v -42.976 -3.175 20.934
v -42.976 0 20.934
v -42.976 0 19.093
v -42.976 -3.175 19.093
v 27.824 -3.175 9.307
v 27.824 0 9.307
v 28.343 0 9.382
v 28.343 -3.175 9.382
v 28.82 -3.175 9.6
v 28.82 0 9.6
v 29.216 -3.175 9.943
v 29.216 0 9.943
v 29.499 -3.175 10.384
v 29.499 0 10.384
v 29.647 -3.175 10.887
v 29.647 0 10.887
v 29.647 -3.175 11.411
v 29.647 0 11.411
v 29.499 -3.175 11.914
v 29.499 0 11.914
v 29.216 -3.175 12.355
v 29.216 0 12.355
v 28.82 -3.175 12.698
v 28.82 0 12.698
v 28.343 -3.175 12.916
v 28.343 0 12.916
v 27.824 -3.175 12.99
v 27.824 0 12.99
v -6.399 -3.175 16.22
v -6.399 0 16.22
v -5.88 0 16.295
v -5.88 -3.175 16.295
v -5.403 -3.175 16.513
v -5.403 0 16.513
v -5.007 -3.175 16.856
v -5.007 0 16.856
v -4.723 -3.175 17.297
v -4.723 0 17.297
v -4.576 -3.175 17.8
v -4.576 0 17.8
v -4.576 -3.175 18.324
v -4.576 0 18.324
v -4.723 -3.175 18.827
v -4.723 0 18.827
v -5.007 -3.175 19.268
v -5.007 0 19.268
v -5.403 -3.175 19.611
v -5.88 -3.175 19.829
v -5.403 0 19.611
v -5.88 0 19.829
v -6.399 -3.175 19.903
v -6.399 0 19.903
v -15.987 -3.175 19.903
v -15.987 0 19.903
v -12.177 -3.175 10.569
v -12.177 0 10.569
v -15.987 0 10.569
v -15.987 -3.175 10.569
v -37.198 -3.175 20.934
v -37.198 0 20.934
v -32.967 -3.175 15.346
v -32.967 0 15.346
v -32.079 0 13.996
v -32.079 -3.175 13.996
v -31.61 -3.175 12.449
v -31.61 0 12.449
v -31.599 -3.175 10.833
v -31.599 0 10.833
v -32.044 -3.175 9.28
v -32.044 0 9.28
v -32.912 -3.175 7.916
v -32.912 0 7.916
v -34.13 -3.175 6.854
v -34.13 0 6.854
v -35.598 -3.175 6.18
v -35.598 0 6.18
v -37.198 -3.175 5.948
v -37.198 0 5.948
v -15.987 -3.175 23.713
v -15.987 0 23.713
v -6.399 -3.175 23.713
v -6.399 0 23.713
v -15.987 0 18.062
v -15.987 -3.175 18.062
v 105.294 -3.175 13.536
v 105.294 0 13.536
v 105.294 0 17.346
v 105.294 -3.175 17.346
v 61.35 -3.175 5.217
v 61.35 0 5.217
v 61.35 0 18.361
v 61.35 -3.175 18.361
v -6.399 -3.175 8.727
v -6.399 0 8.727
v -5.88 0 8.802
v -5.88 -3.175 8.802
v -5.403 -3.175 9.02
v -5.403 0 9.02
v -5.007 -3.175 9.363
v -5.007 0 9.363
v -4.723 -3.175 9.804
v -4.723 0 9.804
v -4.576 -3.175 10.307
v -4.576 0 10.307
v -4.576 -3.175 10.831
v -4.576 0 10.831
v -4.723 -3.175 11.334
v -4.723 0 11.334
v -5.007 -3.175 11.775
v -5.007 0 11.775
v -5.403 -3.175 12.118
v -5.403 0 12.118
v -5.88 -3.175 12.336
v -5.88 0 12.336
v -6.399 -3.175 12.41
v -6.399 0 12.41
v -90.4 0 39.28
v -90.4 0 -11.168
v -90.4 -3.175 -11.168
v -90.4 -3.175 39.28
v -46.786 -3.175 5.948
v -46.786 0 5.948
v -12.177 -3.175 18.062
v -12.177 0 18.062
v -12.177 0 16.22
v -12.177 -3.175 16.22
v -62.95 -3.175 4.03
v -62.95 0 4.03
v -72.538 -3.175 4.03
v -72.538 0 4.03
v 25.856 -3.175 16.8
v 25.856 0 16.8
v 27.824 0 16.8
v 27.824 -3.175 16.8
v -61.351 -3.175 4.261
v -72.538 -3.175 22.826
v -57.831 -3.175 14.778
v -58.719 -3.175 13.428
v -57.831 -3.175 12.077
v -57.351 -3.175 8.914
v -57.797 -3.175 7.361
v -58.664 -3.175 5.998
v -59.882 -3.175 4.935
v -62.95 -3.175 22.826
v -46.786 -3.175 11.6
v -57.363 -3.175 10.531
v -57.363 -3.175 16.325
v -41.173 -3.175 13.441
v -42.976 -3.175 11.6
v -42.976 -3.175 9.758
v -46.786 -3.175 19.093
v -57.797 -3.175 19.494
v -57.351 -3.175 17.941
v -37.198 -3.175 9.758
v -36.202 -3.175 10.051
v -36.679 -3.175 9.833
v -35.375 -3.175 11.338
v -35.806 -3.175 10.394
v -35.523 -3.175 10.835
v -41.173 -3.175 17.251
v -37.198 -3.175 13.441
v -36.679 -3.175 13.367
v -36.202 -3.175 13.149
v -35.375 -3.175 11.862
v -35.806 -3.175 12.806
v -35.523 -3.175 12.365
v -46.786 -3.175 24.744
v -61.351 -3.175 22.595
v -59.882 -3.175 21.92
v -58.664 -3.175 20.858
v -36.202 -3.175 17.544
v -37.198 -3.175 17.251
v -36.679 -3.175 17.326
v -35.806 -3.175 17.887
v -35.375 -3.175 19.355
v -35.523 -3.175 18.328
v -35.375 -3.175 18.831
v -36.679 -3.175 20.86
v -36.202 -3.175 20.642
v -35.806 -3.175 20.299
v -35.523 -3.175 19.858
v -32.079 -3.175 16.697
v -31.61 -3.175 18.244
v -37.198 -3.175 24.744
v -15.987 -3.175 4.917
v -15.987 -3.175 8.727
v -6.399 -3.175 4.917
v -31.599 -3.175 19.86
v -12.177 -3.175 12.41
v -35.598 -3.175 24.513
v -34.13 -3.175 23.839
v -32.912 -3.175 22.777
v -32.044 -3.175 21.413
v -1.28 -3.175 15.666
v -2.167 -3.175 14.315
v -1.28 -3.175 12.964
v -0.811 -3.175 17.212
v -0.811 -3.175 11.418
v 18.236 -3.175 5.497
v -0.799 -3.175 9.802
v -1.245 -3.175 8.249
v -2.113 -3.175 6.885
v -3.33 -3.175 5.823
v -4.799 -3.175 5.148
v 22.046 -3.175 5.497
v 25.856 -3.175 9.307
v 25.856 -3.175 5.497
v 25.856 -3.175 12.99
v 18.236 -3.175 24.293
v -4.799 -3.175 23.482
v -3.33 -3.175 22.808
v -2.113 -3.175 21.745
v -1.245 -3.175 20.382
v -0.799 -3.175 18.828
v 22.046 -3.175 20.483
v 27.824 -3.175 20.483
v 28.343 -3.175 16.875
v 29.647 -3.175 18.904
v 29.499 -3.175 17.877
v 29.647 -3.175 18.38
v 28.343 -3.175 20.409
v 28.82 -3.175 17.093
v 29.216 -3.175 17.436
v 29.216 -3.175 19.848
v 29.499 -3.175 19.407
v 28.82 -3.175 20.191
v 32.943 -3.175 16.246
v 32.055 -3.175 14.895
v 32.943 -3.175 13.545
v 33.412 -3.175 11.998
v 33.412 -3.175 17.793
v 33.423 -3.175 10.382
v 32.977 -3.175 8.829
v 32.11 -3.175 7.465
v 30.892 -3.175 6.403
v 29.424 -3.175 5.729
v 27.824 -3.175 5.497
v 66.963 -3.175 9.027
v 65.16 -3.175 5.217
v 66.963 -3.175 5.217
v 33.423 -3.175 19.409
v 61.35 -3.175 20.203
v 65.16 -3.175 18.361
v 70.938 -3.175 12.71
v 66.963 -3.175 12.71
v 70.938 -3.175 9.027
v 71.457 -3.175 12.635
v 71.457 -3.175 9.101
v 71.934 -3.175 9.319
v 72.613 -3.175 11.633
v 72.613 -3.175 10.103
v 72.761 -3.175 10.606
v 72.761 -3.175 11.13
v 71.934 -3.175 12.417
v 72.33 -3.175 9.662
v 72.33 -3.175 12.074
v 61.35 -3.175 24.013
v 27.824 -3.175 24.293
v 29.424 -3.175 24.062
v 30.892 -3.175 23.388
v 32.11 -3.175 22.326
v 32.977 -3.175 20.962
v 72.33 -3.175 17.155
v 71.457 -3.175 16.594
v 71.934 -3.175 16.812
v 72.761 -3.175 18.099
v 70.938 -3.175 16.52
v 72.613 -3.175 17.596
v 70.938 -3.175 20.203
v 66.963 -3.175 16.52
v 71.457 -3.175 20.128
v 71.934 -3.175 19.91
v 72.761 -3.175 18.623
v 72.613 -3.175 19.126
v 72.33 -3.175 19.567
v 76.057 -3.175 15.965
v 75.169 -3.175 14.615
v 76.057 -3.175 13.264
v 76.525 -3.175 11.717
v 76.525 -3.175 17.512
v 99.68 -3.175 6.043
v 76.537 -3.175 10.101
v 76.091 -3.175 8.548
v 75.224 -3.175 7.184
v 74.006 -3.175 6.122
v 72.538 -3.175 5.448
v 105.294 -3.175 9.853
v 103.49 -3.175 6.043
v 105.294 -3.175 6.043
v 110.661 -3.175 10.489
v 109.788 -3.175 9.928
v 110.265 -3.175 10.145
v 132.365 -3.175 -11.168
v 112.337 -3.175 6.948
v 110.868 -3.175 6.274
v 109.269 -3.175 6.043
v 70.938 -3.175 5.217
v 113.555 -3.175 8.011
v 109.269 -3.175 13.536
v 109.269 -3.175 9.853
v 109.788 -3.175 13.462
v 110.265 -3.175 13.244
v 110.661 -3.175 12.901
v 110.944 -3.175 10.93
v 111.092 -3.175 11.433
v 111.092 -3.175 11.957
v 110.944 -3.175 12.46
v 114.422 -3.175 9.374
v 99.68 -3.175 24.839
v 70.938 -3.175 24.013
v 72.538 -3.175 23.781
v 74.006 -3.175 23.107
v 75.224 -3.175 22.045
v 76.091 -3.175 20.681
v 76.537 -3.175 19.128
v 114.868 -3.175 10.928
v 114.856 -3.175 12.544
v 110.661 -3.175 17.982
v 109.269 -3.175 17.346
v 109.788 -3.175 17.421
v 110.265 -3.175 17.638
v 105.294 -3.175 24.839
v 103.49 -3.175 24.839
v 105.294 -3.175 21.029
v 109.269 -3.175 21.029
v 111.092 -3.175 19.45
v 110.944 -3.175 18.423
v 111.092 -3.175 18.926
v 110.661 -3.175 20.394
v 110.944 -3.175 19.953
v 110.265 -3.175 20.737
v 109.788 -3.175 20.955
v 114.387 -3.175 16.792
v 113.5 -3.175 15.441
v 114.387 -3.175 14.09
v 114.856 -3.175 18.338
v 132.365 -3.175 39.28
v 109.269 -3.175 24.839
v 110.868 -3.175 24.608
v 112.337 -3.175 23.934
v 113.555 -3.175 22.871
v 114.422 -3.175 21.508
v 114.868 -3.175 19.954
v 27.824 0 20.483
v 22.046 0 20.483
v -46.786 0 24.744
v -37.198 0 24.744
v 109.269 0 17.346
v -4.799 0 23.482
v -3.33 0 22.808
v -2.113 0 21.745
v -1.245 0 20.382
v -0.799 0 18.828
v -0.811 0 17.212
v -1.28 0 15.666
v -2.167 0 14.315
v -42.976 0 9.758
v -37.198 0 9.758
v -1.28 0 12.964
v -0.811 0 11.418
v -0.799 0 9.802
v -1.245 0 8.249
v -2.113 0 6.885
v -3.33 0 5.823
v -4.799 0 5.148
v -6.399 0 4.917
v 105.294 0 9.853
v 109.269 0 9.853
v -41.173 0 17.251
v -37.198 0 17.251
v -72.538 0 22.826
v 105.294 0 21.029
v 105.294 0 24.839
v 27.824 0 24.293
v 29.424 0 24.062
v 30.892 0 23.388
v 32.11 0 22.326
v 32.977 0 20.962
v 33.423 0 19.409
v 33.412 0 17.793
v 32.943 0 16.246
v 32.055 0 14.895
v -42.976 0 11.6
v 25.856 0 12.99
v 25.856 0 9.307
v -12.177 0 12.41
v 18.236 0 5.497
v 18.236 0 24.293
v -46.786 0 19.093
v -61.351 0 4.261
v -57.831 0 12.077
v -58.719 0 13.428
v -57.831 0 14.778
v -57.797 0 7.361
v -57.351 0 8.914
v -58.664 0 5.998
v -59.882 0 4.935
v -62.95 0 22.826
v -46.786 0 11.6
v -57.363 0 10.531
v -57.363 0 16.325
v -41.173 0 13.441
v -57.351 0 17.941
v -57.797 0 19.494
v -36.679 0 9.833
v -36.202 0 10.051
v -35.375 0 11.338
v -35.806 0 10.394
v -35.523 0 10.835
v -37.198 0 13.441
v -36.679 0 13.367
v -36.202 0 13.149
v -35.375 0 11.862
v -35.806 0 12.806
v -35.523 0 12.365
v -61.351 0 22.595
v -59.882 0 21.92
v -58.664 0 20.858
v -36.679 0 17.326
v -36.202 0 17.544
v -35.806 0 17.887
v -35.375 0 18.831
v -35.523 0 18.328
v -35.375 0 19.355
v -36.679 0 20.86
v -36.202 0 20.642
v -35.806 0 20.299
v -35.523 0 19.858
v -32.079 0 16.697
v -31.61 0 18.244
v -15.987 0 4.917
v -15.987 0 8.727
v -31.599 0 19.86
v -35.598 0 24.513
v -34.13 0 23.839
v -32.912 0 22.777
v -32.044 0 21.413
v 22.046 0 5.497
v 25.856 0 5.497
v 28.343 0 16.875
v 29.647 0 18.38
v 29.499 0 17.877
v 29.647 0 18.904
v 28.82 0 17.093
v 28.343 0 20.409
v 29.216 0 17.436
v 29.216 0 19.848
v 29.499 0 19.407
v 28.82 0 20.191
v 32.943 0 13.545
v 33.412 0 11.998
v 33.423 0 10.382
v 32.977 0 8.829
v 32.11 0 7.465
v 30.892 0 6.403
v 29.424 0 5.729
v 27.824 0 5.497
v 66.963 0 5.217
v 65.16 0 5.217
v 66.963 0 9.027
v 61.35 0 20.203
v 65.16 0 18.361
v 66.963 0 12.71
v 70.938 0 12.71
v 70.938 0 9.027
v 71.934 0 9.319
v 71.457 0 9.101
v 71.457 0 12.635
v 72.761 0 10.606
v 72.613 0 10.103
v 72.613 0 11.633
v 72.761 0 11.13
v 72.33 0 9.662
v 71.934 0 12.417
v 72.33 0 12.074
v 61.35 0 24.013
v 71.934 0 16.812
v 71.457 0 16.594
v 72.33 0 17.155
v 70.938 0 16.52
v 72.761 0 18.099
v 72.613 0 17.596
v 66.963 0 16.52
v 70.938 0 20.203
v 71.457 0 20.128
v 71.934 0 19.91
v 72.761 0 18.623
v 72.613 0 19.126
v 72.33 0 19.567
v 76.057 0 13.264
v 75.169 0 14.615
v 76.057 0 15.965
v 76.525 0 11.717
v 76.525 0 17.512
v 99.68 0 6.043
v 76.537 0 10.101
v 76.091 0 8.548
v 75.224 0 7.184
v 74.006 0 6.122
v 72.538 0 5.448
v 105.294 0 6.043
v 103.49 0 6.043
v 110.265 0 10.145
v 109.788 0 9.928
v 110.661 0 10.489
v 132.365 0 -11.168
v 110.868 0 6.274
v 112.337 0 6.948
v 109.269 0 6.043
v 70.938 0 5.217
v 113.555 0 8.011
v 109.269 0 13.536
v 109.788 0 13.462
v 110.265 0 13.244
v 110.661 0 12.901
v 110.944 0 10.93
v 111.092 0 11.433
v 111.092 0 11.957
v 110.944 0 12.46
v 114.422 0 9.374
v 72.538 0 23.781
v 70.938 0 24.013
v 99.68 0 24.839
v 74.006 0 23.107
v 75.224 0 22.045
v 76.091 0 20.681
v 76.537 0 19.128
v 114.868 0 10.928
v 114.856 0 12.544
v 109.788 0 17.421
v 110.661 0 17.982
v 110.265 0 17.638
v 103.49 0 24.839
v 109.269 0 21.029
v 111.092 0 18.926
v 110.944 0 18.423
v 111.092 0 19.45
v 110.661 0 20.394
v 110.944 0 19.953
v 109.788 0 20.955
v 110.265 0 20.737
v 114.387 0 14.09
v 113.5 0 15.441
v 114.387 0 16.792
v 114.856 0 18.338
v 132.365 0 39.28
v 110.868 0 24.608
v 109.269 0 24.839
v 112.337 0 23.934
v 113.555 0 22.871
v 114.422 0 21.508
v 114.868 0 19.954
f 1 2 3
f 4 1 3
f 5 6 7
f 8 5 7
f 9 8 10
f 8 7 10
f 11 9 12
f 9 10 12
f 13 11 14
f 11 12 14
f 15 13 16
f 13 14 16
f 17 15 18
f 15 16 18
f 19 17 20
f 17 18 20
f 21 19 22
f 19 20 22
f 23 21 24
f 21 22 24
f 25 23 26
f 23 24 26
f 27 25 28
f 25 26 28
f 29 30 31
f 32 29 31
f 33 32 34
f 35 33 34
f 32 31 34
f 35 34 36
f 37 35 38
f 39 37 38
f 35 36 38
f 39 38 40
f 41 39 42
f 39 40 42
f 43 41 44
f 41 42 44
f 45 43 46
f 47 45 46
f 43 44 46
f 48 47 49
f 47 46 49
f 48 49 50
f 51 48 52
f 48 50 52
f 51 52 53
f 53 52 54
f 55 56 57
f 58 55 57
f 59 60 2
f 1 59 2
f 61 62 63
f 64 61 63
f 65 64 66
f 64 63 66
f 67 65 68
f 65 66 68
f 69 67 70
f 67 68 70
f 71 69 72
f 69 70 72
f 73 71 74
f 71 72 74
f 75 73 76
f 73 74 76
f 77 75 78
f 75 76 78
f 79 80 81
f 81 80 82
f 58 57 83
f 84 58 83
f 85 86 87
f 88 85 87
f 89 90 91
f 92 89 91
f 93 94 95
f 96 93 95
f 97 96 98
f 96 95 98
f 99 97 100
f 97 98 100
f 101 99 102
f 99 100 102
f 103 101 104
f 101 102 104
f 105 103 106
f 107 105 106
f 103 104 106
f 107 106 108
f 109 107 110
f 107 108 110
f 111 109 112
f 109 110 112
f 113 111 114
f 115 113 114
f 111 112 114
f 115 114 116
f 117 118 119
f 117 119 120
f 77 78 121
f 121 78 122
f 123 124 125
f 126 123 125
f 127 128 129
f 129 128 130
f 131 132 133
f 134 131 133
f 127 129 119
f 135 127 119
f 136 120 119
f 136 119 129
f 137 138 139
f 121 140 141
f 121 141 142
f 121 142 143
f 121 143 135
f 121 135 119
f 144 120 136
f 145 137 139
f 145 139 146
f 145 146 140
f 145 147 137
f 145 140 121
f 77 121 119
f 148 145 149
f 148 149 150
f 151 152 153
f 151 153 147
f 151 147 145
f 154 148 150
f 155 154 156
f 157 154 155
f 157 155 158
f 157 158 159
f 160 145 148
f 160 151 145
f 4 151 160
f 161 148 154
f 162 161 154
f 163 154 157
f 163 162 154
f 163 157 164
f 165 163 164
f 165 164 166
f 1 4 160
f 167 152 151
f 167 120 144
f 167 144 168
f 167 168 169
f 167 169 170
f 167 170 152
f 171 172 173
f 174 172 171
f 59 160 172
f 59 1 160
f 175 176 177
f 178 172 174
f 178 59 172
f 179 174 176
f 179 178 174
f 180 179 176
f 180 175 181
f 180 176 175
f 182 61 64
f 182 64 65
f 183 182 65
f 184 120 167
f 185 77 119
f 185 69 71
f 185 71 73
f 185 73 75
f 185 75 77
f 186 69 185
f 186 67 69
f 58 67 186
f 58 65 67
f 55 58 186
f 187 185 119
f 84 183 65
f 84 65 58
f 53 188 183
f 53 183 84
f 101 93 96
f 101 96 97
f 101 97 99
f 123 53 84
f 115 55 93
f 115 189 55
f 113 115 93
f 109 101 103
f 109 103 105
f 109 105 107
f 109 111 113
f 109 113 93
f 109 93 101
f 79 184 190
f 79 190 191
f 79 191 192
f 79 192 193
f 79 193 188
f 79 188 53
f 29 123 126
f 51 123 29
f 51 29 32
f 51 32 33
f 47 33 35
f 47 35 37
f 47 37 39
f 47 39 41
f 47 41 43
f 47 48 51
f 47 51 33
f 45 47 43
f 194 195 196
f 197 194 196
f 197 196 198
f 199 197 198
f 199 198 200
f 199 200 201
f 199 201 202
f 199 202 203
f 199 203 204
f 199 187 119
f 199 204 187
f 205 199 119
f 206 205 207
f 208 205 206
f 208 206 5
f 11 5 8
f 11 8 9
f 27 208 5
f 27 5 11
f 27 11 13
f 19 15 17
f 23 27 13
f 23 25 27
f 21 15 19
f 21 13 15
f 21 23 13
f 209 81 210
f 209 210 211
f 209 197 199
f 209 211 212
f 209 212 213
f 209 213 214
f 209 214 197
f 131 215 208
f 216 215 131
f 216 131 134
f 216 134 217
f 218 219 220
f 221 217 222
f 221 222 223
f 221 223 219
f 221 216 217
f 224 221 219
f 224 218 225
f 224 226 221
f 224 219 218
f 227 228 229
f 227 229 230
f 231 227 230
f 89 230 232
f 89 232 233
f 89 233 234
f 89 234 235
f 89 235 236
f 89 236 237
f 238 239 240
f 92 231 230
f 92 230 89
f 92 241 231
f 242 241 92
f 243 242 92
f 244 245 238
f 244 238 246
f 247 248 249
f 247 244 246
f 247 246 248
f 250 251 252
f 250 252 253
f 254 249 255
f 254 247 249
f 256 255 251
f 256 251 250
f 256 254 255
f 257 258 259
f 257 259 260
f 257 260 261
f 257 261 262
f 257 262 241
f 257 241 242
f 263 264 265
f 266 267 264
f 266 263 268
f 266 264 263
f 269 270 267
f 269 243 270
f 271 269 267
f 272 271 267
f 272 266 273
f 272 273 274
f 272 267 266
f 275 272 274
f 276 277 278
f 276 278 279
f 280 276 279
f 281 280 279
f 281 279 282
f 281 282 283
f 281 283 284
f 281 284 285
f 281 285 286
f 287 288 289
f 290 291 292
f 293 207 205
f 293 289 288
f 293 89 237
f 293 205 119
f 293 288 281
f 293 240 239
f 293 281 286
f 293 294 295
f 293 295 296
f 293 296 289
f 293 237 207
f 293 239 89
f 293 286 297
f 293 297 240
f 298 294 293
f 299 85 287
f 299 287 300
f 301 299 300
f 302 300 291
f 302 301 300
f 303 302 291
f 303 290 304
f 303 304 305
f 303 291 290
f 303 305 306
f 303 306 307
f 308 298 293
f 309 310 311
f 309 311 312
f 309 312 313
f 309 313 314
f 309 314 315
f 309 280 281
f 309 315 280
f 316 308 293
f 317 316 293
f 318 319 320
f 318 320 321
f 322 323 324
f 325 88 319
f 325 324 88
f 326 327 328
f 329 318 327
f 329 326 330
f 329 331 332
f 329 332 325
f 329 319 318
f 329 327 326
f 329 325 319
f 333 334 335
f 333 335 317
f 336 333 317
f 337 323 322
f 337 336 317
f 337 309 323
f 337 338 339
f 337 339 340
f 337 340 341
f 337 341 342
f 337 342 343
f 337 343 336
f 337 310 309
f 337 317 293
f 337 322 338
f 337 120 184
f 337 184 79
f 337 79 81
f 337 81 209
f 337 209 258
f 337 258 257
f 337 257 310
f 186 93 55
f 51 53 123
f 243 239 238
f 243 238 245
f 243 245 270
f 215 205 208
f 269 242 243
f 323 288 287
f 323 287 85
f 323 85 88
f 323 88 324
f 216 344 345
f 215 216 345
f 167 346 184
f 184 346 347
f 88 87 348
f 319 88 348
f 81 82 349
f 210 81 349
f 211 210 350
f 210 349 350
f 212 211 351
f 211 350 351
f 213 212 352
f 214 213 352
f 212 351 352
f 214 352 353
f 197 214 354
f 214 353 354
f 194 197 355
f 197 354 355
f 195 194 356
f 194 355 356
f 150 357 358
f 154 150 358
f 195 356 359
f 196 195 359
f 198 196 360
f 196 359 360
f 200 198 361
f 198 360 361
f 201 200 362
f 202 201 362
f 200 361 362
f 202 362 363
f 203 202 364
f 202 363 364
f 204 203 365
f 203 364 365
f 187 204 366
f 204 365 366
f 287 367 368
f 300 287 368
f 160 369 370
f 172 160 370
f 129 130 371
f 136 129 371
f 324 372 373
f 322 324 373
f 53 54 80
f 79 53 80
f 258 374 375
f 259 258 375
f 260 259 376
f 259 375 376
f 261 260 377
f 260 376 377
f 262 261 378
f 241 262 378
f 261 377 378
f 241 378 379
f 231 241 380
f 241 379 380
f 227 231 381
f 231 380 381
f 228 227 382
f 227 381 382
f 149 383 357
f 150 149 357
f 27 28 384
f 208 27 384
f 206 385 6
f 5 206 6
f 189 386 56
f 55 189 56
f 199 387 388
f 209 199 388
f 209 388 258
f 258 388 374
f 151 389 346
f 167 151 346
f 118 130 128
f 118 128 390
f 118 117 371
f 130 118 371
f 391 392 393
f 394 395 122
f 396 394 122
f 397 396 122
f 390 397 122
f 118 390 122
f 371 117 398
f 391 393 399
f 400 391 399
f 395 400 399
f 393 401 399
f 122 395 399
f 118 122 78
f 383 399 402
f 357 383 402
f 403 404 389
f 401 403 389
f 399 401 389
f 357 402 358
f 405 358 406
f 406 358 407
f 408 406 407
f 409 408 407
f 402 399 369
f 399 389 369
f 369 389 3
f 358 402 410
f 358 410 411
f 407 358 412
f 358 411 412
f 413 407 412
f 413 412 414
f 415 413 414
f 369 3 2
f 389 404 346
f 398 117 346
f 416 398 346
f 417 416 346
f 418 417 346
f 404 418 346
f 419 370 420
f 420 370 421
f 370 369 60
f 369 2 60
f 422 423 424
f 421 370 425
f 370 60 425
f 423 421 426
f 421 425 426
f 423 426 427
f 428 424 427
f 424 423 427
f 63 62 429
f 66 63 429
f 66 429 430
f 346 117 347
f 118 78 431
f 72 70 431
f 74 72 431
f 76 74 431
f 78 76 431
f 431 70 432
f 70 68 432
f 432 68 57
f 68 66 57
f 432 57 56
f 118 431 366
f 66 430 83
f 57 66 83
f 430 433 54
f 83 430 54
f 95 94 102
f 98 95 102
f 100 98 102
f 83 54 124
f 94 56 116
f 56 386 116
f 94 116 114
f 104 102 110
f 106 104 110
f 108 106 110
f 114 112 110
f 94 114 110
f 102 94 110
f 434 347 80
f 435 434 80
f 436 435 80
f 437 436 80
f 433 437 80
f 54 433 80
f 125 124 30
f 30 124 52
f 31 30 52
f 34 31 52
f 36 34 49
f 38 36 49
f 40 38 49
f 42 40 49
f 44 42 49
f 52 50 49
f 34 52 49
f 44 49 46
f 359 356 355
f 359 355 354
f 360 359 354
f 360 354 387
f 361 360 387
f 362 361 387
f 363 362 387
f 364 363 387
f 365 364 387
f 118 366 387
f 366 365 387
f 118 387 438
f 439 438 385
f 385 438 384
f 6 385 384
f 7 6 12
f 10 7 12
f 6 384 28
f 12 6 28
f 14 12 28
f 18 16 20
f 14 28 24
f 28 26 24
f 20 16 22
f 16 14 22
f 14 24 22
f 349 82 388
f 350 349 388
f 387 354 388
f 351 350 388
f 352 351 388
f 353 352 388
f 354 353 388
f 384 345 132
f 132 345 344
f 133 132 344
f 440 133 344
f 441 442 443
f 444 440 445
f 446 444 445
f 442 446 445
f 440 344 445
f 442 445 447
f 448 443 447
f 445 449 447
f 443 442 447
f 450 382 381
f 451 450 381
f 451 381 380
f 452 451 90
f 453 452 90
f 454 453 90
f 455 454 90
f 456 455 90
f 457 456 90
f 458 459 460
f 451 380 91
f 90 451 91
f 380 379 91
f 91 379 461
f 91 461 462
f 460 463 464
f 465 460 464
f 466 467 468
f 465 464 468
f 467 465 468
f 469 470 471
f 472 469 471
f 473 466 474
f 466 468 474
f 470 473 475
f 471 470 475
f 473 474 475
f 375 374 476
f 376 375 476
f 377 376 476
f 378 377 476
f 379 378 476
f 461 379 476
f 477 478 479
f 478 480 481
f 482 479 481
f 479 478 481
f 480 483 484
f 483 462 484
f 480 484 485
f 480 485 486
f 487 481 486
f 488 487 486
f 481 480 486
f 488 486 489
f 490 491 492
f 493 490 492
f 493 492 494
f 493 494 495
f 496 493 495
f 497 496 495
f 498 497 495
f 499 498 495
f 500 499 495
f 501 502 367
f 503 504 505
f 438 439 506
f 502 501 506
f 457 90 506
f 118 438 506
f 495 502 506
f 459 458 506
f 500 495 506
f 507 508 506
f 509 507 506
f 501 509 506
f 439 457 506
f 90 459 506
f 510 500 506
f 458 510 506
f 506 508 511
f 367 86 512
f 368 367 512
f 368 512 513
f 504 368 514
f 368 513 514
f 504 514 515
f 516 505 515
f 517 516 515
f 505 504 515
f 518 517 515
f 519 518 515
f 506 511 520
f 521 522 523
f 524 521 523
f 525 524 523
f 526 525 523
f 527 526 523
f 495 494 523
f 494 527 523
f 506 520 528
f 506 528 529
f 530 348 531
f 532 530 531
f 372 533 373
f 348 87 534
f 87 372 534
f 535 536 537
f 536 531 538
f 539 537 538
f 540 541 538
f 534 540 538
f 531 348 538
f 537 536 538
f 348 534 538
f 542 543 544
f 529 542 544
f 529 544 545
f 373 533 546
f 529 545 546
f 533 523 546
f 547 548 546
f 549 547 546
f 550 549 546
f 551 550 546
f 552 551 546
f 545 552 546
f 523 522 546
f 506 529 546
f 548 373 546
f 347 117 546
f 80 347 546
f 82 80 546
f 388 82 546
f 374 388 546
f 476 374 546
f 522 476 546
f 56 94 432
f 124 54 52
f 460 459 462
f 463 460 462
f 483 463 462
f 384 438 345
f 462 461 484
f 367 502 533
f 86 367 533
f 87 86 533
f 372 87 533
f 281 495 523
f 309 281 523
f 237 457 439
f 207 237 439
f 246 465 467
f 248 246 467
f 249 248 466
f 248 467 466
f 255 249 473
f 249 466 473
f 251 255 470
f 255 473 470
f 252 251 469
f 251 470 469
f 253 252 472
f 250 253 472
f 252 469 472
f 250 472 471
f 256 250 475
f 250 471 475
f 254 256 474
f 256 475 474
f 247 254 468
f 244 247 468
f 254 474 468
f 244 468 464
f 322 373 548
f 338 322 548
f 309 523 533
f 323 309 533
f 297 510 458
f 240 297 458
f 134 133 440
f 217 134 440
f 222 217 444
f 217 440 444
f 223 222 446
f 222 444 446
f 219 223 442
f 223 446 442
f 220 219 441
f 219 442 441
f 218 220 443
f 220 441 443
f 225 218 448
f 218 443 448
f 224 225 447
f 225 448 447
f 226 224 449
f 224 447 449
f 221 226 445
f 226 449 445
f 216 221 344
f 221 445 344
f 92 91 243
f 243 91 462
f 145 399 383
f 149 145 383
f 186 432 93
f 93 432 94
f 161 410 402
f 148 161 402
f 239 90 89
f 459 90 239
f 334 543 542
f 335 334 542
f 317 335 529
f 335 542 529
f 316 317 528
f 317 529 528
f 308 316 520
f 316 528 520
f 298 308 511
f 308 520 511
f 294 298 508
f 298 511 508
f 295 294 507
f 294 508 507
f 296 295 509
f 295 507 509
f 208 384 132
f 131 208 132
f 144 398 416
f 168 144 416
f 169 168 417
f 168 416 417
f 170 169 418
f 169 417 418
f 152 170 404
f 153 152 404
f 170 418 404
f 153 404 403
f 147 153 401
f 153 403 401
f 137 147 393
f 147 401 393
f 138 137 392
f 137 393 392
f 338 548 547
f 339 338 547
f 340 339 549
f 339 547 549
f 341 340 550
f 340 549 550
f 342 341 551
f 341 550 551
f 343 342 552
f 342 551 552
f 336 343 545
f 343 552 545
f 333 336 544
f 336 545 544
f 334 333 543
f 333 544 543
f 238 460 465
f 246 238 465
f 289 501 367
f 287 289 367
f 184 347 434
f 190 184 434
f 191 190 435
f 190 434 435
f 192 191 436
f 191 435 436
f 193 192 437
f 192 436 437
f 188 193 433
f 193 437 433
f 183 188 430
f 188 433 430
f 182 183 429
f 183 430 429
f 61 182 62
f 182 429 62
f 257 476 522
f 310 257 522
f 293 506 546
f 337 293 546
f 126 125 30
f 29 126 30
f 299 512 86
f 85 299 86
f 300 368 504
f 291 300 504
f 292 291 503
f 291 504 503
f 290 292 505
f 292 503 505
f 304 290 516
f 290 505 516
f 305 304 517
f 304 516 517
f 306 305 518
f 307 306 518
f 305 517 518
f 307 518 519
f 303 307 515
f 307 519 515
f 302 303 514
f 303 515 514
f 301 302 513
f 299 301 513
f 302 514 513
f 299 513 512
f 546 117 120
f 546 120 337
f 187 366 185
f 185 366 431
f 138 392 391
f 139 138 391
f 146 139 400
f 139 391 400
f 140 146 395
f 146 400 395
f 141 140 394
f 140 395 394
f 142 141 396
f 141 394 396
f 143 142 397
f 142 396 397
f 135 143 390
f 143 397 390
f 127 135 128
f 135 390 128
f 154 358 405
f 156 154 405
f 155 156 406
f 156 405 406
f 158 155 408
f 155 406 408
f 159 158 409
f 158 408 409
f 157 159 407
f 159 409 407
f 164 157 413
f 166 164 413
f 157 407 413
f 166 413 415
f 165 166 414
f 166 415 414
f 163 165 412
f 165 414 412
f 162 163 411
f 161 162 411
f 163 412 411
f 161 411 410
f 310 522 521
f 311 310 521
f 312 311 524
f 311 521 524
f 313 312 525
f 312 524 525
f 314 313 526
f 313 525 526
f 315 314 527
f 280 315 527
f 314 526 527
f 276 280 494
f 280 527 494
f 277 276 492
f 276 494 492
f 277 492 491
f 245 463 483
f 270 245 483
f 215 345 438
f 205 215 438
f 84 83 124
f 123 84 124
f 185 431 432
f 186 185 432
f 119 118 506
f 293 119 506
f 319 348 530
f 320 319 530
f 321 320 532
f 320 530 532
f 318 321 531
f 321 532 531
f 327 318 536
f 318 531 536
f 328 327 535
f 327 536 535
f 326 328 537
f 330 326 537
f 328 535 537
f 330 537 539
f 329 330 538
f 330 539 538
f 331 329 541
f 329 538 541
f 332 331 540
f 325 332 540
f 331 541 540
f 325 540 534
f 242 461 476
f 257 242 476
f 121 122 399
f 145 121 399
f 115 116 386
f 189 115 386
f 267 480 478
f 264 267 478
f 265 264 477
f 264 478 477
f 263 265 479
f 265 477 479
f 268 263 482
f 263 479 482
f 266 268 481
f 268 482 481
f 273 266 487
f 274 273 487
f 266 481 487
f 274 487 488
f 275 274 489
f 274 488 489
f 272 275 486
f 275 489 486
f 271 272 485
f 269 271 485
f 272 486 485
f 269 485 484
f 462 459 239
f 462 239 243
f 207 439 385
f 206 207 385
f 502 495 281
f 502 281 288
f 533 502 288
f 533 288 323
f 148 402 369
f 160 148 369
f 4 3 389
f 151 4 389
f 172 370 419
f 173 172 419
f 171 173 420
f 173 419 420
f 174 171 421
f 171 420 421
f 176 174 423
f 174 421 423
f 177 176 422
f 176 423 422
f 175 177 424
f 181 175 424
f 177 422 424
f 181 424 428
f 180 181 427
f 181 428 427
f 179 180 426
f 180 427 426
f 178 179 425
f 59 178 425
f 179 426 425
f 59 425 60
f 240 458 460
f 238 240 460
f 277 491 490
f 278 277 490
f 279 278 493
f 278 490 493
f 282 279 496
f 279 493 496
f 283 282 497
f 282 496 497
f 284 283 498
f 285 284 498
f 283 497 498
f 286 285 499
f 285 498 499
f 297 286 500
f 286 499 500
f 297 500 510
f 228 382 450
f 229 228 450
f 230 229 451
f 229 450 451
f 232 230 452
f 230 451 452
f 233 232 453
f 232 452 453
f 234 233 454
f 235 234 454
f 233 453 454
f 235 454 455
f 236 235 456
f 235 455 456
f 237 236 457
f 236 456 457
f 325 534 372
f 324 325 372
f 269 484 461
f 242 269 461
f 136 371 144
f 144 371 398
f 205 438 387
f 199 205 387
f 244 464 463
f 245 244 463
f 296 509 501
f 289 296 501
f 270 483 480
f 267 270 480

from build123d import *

# Parameters (mm, degrees)
F0_W     = 222.764201
F0_H     = 50.447313
F0_W_2   = 3.81
F0_H_2   = 13.1445
F0_H_3   = 18.796
F1_DEPTH = 3.175


with BuildPart() as f1:
    # F0 (on Front) → F1 (new body)
    with BuildSketch(Plane.XZ):
        with Locations((20.982425, 14.055919)):
            Rectangle(F0_W, F0_H)
        with BuildLine():
            Line((-62.95, 4.029787), (-72.5385, 4.029787))
            Line((-72.5385, 4.029787), (-72.5385, 22.825787))
            Line((-72.5385, 22.825787), (-62.95, 22.825787))
            ThreePointArc((-62.95, 22.825787), (-57.79671, 19.494427), (-58.718784, 13.427787))
            ThreePointArc((-58.718784, 13.427787), (-57.79671, 7.361146), (-62.95, 4.029787))
        make_face(mode=Mode.SUBTRACT)
        with Locations((63.254545, 11.788765)):
            Rectangle(F0_W_2, F0_H_2, mode=Mode.SUBTRACT)
        with BuildLine():
            Line((-37.197788, 5.948498), (-46.786288, 5.948498))
            Line((-46.786288, 5.948498), (-46.786288, 11.599998))
            Line((-46.786288, 11.599998), (-42.976288, 11.599998))
            Line((-42.976288, 11.599998), (-42.976288, 9.758498))
            Line((-42.976288, 9.758498), (-37.197788, 9.758498))
            ThreePointArc((-37.197788, 9.758498), (-35.356288, 11.599998), (-37.197788, 13.441498))
            Line((-37.197788, 13.441498), (-41.172888, 13.441498))
            Line((-41.172888, 13.441498), (-41.172888, 17.251498))
            Line((-41.172888, 17.251498), (-37.197788, 17.251498))
            ThreePointArc((-37.197788, 17.251498), (-35.356288, 19.092998), (-37.197788, 20.934498))
            Line((-37.197788, 20.934498), (-42.976288, 20.934498))
            Line((-42.976288, 20.934498), (-42.976288, 19.092998))
            Line((-42.976288, 19.092998), (-46.786288, 19.092998))
            Line((-46.786288, 19.092998), (-46.786288, 24.744498))
            Line((-46.786288, 24.744498), (-37.197788, 24.744498))
            ThreePointArc((-37.197788, 24.744498), (-32.044498, 21.413139), (-32.966572, 15.346498))
            ThreePointArc((-32.966572, 15.346498), (-32.044498, 9.279857), (-37.197788, 5.948498))
        make_face(mode=Mode.SUBTRACT)
        with BuildLine():
            Line((-6.398563, 4.917182), (-15.987063, 4.917182))
            Line((-15.987063, 4.917182), (-15.987063, 8.727182))
            Line((-15.987063, 8.727182), (-6.398563, 8.727182))
            ThreePointArc((-6.398563, 8.727182), (-4.557063, 10.568682), (-6.398563, 12.410182))
            Line((-6.398563, 12.410182), (-12.177063, 12.410182))
            Line((-12.177063, 12.410182), (-12.177063, 10.568682))
            Line((-12.177063, 10.568682), (-15.987063, 10.568682))
            Line((-15.987063, 10.568682), (-15.987063, 18.061682))
            Line((-15.987063, 18.061682), (-12.177063, 18.061682))
            Line((-12.177063, 18.061682), (-12.177063, 16.220182))
            Line((-12.177063, 16.220182), (-6.398563, 16.220182))
            ThreePointArc((-6.398563, 16.220182), (-4.557063, 18.061682), (-6.398563, 19.903182))
            Line((-6.398563, 19.903182), (-15.987063, 19.903182))
            Line((-15.987063, 19.903182), (-15.987063, 23.713182))
            Line((-15.987063, 23.713182), (-6.398563, 23.713182))
            ThreePointArc((-6.398563, 23.713182), (-1.245273, 20.381823), (-2.167347, 14.315182))
            ThreePointArc((-2.167347, 14.315182), (-1.245273, 8.248541), (-6.398563, 4.917182))
        make_face(mode=Mode.SUBTRACT)
        with BuildLine():
            Line((22.045695, 5.497487), (18.235695, 5.497487))
            Line((18.235695, 5.497487), (18.235695, 24.293487))
            Line((18.235695, 24.293487), (27.824195, 24.293487))
            ThreePointArc((27.824195, 24.293487), (32.977485, 20.962128), (32.055411, 14.895487))
            ThreePointArc((32.055411, 14.895487), (32.977485, 8.828846), (27.824195, 5.497487))
            Line((27.824195, 5.497487), (25.855695, 5.497487))
            Line((25.855695, 5.497487), (25.855695, 9.307487))
            Line((25.855695, 9.307487), (27.824195, 9.307487))
            ThreePointArc((27.824195, 9.307487), (29.665695, 11.148987), (27.824195, 12.990487))
            Line((27.824195, 12.990487), (25.855695, 12.990487))
            Line((25.855695, 12.990487), (25.855695, 16.800487))
            Line((25.855695, 16.800487), (27.824195, 16.800487))
            ThreePointArc((27.824195, 16.800487), (29.665695, 18.641987), (27.824195, 20.483487))
            Line((27.824195, 20.483487), (22.045695, 20.483487))
            Line((22.045695, 20.483487), (22.045695, 5.497487))
        make_face(mode=Mode.SUBTRACT)
        with BuildLine():
            Line((61.349545, 20.202515), (61.349545, 24.012515))
            Line((61.349545, 24.012515), (70.938045, 24.012515))
            ThreePointArc((70.938045, 24.012515), (76.091335, 20.681156), (75.169261, 14.614515))
            ThreePointArc((75.169261, 14.614515), (76.091335, 8.547874), (70.938045, 5.216515))
            Line((70.938045, 5.216515), (66.962945, 5.216515))
            Line((66.962945, 5.216515), (66.962945, 9.026515))
            Line((66.962945, 9.026515), (70.938045, 9.026515))
            ThreePointArc((70.938045, 9.026515), (72.779545, 10.868015), (70.938045, 12.709515))
            Line((70.938045, 12.709515), (66.962945, 12.709515))
            Line((66.962945, 12.709515), (66.962945, 16.519515))
            Line((66.962945, 16.519515), (70.938045, 16.519515))
            ThreePointArc((70.938045, 16.519515), (72.779545, 18.361015), (70.938045, 20.202515))
            Line((70.938045, 20.202515), (61.349545, 20.202515))
        make_face(mode=Mode.SUBTRACT)
        with Locations((101.585424, 15.441135)):
            Rectangle(F0_W_2, F0_H_3, mode=Mode.SUBTRACT)
        with BuildLine():
            ThreePointArc((113.50014, 15.441135), (114.422214, 9.374494), (109.268924, 6.043135))
            Line((109.268924, 6.043135), (105.293824, 6.043135))
            Line((105.293824, 6.043135), (105.293824, 9.853135))
            Line((105.293824, 9.853135), (109.268924, 9.853135))
            ThreePointArc((109.268924, 9.853135), (111.110424, 11.694635), (109.268924, 13.536135))
            Line((109.268924, 13.536135), (105.293824, 13.536135))
            Line((105.293824, 13.536135), (105.293824, 17.346135))
            Line((105.293824, 17.346135), (109.268924, 17.346135))
            ThreePointArc((109.268924, 17.346135), (111.110424, 19.187635), (109.268924, 21.029135))
            Line((109.268924, 21.029135), (105.293824, 21.029135))
            Line((105.293824, 21.029135), (105.293824, 24.839135))
            Line((105.293824, 24.839135), (109.268924, 24.839135))
            ThreePointArc((109.268924, 24.839135), (114.422214, 21.507776), (113.50014, 15.441135))
        make_face(mode=Mode.SUBTRACT)
    extrude(amount=F1_DEPTH)


solid = f1.part
